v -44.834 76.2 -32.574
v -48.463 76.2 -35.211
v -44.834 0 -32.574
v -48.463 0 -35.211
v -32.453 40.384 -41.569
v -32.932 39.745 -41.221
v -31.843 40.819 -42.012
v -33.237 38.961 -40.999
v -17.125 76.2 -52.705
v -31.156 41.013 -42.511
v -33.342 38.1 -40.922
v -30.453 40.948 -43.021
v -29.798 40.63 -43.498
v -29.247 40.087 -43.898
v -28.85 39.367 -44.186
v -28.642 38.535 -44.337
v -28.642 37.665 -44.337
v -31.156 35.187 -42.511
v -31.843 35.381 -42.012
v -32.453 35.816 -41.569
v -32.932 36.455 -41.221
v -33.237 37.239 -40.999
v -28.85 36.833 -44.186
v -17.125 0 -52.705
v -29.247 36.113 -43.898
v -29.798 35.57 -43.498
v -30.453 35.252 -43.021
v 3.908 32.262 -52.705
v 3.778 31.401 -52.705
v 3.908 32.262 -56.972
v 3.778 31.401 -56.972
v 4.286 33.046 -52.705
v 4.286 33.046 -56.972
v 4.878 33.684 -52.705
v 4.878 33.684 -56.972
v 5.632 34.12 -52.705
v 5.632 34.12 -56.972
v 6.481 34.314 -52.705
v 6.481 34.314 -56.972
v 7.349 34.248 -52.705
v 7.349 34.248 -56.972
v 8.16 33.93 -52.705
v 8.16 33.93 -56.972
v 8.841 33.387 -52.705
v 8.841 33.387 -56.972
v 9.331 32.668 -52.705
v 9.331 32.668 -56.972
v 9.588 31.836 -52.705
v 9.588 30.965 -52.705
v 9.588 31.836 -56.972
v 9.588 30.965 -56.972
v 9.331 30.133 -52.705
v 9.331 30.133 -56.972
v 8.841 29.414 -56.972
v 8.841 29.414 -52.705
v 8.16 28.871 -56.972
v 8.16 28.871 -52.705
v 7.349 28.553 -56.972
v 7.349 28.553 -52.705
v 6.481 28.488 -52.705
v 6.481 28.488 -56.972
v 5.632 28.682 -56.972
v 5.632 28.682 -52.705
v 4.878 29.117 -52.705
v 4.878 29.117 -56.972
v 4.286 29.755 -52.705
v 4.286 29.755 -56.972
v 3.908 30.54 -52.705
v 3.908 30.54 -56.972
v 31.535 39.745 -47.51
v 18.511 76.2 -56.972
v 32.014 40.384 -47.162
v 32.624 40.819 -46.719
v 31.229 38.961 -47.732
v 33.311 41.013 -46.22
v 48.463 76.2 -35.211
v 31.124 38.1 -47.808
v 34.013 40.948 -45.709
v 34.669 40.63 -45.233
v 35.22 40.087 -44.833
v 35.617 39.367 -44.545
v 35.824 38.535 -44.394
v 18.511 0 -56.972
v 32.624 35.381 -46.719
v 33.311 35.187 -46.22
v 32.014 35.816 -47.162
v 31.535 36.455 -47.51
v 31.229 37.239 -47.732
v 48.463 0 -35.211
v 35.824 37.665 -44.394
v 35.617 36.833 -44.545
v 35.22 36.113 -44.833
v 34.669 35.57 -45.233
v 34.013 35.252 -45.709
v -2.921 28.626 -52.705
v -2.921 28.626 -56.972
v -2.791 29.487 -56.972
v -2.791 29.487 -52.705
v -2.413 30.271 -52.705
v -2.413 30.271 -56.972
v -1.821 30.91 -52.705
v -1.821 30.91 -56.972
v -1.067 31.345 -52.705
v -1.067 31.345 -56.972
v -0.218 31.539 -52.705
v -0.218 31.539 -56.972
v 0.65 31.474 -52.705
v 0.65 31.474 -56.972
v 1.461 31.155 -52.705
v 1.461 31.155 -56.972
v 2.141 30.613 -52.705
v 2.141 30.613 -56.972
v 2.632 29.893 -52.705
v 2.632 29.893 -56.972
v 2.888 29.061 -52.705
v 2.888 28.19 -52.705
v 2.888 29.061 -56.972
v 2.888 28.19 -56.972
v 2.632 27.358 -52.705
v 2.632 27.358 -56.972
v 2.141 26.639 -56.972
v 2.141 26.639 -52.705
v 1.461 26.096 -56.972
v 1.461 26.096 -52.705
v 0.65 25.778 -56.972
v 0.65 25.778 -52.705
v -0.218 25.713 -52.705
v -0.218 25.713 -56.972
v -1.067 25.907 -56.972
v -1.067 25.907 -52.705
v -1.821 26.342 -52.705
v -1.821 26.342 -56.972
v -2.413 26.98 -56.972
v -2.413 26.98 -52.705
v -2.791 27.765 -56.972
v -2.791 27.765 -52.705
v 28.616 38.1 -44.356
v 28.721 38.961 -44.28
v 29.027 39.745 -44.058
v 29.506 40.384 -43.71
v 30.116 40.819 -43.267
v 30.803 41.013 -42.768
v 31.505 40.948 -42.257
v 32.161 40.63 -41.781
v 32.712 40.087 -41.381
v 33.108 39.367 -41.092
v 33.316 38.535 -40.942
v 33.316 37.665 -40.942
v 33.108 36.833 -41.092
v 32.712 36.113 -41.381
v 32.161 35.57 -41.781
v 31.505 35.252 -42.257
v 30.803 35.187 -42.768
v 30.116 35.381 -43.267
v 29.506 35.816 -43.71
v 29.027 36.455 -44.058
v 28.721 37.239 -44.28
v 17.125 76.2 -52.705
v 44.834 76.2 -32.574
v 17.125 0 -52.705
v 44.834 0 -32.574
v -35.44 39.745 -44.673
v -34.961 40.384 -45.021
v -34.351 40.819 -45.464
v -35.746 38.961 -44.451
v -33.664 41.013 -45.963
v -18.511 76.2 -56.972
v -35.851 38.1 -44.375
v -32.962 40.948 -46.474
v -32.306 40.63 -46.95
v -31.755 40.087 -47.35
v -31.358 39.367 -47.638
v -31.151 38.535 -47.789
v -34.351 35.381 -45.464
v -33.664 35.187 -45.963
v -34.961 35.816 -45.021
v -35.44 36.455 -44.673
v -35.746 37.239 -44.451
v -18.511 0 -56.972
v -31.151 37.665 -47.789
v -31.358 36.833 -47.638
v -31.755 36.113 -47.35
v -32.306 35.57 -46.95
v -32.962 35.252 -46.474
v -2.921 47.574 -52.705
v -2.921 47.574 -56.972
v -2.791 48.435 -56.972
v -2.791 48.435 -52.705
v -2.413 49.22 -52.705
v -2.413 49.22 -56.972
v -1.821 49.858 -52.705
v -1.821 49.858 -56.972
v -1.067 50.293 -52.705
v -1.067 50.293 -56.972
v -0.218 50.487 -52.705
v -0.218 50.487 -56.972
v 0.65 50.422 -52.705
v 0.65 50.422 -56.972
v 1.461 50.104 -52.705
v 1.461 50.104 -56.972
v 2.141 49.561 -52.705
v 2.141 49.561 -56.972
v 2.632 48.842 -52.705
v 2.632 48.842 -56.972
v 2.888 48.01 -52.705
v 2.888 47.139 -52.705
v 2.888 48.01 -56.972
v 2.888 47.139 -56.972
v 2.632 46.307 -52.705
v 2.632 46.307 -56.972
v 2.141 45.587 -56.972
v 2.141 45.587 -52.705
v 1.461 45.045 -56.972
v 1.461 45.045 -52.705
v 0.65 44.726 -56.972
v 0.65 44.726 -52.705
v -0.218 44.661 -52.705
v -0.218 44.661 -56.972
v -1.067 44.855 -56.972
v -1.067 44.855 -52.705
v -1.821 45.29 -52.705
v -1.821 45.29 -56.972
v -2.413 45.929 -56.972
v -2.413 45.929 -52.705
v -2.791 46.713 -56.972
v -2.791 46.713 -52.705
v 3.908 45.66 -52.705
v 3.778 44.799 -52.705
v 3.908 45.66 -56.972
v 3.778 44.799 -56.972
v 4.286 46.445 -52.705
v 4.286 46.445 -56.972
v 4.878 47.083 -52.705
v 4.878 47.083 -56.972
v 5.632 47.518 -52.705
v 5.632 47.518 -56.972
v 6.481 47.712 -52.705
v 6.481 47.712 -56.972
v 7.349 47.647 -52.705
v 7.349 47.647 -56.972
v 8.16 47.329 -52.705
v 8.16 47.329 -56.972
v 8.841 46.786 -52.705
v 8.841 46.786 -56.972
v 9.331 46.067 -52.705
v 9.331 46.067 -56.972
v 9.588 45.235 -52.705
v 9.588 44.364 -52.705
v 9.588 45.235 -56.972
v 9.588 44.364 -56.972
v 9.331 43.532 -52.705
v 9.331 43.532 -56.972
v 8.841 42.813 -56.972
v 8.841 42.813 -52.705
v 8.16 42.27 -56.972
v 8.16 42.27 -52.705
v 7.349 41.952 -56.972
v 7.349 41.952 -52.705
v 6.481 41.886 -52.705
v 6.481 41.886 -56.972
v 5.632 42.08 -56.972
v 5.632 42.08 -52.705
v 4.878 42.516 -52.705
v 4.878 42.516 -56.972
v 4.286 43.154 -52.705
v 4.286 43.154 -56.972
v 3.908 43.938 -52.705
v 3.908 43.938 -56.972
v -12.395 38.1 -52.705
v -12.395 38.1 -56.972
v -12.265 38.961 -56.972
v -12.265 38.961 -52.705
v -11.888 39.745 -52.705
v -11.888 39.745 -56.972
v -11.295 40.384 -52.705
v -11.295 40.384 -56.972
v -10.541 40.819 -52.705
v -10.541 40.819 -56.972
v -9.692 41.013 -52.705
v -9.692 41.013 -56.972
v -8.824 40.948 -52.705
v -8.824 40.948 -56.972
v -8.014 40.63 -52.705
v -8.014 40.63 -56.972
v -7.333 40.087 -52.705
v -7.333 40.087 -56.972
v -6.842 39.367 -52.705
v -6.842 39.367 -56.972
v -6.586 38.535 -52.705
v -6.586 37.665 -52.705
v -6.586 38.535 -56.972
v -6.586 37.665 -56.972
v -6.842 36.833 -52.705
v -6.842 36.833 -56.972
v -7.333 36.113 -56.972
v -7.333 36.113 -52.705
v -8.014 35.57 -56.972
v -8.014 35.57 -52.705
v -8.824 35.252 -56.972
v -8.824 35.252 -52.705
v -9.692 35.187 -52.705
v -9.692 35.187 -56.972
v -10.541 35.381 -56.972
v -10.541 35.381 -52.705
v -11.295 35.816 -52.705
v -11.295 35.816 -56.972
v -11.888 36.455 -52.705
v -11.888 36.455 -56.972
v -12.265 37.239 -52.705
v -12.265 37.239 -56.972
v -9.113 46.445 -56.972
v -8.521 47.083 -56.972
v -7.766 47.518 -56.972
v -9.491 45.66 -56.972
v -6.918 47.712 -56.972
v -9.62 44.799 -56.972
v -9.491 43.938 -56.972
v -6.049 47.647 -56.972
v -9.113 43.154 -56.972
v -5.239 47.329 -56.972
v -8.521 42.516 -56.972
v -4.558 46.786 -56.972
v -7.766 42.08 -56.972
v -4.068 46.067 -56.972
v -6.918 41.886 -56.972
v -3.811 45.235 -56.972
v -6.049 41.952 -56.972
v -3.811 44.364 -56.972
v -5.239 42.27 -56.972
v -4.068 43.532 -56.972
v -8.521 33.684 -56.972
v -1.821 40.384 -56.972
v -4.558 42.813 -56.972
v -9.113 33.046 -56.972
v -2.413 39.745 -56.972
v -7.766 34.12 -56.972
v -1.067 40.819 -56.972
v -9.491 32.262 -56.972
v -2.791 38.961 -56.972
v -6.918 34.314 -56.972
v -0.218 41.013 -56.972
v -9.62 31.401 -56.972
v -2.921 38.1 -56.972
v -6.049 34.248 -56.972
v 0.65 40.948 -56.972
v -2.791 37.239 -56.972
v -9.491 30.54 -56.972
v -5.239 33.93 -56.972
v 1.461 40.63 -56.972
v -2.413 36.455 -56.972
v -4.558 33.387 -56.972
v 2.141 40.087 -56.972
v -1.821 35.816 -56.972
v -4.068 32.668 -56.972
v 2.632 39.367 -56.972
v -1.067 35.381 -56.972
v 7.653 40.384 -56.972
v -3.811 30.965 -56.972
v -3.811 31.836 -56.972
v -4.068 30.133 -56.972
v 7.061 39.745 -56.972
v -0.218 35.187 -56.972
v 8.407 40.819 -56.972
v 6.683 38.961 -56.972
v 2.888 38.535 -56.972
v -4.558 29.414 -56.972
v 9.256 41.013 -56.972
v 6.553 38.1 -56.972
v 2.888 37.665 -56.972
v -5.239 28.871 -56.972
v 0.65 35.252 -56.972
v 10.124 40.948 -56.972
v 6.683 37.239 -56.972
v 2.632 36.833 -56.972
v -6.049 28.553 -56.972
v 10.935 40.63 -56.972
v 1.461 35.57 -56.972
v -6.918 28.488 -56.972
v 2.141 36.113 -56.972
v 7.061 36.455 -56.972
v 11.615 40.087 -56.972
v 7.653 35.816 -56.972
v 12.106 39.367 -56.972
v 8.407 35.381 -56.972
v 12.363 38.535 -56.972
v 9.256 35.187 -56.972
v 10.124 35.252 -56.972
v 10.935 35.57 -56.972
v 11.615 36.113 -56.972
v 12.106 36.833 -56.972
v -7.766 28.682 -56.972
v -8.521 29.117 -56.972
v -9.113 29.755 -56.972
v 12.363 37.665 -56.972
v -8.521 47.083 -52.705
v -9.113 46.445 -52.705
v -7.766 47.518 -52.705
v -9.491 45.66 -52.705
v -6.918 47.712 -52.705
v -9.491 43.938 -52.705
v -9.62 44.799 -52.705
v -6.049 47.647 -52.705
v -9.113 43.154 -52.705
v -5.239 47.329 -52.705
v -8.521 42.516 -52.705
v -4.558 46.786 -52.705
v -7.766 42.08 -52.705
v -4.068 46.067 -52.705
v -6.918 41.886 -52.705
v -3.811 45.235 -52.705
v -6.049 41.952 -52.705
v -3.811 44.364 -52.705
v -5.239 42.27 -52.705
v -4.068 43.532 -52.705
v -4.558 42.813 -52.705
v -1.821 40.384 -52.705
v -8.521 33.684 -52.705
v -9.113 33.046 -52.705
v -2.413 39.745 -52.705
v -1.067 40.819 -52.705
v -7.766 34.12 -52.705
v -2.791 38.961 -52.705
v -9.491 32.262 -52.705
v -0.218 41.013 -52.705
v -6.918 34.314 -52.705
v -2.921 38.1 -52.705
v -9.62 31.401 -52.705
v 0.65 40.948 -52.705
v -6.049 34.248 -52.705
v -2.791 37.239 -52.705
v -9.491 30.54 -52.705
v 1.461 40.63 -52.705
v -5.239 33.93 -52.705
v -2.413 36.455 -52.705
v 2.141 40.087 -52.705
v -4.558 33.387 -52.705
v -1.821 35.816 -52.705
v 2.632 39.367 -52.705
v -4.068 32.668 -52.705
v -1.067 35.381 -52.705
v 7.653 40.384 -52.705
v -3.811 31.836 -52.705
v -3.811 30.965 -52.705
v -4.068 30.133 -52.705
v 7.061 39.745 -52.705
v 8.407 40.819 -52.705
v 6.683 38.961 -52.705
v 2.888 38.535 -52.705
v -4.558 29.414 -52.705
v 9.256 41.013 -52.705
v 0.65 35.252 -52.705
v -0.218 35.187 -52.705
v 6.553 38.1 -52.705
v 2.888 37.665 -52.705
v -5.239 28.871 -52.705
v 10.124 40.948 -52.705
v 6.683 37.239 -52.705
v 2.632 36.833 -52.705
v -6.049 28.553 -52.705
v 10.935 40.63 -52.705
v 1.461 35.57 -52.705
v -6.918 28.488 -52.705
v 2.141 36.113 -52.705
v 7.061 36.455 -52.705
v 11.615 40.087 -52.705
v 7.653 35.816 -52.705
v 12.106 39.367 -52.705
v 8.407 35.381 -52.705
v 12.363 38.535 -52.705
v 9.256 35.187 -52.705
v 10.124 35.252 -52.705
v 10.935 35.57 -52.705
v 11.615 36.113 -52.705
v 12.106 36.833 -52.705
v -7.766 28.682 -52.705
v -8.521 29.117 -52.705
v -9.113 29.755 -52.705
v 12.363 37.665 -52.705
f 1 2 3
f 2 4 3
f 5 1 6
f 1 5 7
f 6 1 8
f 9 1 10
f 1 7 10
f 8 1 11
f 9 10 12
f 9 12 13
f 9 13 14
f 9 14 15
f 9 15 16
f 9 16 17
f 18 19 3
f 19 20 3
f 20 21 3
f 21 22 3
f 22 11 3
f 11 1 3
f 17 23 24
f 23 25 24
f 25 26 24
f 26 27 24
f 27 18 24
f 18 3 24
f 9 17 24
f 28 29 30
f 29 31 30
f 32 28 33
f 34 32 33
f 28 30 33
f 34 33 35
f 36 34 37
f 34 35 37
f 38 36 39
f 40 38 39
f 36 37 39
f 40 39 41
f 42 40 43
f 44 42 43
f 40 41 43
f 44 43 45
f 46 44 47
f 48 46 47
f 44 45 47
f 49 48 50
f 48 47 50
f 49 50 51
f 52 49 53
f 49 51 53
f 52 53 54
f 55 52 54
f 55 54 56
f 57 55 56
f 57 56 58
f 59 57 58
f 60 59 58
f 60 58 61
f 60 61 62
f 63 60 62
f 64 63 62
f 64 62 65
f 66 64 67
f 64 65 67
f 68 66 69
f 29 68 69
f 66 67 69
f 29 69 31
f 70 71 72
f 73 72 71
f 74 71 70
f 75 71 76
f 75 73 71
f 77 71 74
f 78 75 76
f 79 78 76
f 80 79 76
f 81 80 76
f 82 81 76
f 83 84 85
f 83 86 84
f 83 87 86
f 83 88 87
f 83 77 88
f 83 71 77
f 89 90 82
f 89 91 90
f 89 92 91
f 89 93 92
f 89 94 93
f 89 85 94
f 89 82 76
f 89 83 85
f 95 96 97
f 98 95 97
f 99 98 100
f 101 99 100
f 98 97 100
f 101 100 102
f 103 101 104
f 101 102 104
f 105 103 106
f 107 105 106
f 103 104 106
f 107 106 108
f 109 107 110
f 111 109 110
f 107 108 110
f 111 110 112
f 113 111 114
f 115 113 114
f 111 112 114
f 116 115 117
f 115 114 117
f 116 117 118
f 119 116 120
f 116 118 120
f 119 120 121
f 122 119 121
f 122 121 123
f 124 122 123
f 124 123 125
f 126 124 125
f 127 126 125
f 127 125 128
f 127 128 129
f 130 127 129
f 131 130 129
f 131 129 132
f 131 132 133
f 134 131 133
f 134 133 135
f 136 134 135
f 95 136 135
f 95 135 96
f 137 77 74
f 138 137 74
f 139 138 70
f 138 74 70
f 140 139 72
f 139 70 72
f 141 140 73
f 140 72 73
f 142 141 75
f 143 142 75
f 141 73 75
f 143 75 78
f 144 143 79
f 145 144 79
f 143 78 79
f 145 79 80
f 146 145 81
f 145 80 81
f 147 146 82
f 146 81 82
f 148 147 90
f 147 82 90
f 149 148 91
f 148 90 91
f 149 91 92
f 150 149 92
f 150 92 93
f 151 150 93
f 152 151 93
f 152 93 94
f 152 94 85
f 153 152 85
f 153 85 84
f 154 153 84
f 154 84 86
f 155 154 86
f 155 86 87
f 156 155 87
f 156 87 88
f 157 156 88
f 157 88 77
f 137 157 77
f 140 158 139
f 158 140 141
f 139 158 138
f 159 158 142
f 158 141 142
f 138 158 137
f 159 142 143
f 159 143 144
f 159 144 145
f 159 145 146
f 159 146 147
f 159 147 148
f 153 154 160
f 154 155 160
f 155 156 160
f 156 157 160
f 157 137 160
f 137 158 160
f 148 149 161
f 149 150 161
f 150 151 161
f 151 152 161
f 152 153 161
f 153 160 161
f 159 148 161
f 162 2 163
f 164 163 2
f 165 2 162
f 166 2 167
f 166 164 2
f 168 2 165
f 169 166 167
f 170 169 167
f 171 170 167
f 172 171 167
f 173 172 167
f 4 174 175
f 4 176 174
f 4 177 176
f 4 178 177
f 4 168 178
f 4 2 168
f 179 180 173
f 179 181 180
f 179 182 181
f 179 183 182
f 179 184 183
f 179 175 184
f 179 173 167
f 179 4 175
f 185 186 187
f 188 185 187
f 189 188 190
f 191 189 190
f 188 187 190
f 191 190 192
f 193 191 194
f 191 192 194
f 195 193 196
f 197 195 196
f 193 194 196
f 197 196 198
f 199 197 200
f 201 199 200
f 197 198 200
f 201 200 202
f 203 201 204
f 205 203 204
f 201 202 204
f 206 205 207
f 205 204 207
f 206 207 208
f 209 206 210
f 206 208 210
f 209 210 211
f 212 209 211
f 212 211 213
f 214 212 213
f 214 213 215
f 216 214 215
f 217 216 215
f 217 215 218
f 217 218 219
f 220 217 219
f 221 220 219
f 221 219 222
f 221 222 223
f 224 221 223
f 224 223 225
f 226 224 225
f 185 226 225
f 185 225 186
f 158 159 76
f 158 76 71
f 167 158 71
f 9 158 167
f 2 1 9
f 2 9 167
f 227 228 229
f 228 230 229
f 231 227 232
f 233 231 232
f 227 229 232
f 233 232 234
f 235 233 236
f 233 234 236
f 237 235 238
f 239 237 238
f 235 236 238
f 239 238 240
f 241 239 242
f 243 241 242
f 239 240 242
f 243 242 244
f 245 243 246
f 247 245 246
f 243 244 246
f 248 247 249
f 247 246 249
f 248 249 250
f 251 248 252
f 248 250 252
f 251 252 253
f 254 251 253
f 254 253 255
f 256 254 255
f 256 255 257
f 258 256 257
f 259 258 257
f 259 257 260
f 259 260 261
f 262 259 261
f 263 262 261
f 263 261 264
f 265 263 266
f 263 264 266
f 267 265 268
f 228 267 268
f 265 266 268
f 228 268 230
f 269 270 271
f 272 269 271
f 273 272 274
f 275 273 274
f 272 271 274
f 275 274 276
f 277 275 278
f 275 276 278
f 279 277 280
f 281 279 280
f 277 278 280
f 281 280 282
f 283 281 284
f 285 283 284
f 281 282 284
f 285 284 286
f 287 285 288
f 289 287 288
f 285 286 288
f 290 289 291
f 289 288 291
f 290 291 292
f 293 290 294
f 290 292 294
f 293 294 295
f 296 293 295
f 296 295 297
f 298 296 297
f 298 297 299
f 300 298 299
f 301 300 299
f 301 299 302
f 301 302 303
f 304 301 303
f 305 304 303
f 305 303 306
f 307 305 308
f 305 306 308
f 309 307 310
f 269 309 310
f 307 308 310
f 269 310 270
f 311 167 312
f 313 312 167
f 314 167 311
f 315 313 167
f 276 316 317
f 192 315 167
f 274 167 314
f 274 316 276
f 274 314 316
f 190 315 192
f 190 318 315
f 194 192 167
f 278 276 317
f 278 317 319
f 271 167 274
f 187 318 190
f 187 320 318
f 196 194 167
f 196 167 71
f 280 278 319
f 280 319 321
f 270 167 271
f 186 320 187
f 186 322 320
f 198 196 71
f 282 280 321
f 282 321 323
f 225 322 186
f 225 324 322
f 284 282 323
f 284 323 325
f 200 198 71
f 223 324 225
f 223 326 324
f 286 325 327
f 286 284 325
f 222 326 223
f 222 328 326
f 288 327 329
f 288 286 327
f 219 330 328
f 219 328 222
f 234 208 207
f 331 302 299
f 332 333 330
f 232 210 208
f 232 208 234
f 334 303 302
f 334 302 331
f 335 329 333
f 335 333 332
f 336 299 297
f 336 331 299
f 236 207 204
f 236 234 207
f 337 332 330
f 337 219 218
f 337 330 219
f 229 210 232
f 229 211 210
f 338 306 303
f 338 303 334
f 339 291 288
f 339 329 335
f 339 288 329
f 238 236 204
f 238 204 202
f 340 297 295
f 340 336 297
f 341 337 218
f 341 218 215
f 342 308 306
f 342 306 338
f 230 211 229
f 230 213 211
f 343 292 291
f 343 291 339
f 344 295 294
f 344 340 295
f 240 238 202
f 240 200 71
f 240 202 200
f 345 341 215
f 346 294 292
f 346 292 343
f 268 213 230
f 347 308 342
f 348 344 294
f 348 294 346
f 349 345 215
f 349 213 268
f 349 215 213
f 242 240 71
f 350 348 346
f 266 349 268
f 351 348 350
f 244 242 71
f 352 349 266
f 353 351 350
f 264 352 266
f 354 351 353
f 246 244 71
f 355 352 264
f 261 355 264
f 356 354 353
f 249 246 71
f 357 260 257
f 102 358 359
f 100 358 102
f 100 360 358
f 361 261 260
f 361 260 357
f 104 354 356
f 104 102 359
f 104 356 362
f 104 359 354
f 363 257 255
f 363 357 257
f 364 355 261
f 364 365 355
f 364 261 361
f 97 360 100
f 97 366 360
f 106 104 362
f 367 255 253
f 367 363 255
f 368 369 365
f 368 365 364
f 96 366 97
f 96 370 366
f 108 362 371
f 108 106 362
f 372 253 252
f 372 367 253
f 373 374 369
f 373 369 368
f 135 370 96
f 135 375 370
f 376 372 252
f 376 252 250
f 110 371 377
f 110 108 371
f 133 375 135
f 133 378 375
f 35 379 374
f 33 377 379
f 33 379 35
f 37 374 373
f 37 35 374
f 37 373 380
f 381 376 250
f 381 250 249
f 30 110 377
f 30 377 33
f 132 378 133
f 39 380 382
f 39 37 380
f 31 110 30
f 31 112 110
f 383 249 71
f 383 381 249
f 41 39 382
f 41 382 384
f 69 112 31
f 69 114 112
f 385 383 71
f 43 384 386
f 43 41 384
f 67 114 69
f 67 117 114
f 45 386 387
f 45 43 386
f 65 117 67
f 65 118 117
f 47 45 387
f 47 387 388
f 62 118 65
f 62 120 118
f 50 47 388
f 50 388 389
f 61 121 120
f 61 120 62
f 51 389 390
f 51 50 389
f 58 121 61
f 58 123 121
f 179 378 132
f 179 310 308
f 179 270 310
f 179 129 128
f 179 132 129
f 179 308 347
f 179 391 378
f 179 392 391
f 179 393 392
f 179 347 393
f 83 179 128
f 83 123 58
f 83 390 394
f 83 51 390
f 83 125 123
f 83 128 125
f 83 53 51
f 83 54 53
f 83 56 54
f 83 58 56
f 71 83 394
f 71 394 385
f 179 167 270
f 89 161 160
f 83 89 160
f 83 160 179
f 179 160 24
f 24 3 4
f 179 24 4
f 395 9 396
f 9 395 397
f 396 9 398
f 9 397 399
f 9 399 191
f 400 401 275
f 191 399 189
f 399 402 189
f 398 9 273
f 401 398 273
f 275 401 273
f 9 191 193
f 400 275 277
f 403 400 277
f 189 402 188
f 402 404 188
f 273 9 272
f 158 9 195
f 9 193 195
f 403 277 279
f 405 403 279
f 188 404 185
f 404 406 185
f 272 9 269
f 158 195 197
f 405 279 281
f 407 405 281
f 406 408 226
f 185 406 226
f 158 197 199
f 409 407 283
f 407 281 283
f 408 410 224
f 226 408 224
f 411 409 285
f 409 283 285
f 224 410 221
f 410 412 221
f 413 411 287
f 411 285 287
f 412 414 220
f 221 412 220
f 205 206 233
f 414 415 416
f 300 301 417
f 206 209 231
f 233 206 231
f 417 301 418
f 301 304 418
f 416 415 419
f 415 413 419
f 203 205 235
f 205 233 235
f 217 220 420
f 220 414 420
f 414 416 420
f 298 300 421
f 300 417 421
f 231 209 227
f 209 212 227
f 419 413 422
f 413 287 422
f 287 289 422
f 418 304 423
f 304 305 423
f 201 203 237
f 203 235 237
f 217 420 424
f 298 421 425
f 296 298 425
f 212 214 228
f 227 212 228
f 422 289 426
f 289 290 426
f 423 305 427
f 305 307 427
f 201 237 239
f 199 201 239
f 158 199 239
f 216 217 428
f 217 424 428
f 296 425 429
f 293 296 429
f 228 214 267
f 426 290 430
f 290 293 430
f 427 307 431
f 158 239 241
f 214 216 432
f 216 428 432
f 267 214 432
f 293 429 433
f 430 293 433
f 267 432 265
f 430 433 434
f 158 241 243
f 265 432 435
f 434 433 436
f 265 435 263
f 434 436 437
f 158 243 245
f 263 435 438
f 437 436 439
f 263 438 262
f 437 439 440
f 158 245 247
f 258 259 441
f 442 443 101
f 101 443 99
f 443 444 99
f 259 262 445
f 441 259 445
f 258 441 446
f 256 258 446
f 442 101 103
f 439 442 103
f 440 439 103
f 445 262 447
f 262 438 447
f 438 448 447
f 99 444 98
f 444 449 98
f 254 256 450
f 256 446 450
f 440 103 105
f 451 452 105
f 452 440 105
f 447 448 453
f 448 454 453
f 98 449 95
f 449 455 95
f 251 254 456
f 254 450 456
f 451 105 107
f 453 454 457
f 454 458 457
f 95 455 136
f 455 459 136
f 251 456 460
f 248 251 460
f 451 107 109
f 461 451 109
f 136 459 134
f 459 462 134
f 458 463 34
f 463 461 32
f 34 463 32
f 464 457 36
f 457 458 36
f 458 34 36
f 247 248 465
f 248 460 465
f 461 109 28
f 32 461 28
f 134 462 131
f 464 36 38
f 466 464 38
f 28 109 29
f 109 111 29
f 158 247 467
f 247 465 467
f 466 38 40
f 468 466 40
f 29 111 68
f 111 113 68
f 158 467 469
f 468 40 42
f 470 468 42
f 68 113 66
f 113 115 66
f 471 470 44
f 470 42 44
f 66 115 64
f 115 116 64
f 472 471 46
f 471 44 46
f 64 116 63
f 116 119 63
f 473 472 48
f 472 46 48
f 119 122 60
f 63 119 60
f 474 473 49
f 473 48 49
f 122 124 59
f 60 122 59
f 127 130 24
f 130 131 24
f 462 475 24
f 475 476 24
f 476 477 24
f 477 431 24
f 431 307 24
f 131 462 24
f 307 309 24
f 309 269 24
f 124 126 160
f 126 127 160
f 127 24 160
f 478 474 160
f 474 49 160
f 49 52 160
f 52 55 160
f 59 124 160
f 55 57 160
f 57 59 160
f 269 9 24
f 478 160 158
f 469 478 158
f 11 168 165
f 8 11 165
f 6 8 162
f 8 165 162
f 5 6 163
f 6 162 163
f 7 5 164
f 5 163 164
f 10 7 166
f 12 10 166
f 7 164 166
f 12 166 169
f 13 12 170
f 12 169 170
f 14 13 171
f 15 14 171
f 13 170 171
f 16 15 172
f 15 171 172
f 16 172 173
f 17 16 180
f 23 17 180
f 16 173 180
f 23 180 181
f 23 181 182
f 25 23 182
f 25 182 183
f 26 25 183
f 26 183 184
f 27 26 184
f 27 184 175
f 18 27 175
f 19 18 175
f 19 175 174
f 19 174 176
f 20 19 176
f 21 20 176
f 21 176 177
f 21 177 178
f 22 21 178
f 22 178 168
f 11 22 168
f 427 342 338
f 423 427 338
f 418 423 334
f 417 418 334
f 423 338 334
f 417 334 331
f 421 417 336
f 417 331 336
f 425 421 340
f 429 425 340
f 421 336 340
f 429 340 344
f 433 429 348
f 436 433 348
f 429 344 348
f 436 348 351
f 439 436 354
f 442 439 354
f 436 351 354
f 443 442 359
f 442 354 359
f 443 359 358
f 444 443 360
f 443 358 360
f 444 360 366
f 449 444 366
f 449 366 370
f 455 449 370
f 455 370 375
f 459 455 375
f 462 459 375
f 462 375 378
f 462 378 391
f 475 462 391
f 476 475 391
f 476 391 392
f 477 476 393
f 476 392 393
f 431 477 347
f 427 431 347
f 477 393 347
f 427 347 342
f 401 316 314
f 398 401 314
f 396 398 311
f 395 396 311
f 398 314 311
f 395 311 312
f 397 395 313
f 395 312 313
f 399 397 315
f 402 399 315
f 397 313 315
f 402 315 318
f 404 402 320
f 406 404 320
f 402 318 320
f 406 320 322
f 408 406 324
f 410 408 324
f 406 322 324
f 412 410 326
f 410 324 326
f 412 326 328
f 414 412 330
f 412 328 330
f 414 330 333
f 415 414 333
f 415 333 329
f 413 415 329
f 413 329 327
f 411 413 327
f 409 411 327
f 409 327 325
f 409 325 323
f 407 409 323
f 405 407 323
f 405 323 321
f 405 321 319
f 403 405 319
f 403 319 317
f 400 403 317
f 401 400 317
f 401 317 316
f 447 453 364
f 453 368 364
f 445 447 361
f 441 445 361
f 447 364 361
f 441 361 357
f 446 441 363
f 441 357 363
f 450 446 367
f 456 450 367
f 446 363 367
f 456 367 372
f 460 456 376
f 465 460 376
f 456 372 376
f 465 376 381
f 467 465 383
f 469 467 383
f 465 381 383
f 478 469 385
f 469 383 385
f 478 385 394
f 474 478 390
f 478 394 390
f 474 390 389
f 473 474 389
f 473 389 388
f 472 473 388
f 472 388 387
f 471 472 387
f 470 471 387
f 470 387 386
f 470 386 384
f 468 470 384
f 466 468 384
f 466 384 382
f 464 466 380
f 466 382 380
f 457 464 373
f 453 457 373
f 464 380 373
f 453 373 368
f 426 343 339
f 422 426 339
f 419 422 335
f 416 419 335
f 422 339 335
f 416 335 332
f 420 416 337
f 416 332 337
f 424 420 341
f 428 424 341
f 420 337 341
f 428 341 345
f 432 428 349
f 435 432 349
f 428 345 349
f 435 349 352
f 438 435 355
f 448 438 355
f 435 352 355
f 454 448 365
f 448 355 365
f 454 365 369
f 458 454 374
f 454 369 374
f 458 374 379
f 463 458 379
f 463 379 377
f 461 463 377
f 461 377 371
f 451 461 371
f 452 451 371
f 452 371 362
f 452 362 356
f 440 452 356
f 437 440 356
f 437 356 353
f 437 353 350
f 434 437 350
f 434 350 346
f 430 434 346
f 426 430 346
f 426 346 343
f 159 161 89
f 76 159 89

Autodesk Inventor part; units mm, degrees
ref_plane "YZ Plane" through (0, 0, 0) normal (1, 0, 0) x (0, 1, 0)
ref_plane "XZ Plane" through (0, 0, 0) normal (0, 1, 0) x (-1, 0, 0)
ref_plane "XY Plane" through (0, 0, 0) normal (0, 0, 1) x (1, 0, 0)
sketch "Sketch1" plane through (0, 0, 0) normal (0, 1, 0) x (-1, 0, 0)
  line L0 (44.8336, -32.5735) -> (17.1249, -52.705)
  line L1 (17.1249, -52.705) -> (-17.1249, -52.705)
  line L2 (-17.1249, -52.705) -> (-44.8336, -32.5735)
  line L3 (48.4634, -35.2108) -> (18.5114, -56.9722)
  line L4 (18.5114, -56.9722) -> (-18.5114, -56.9722)
  line L5 (-18.5114, -56.9722) -> (-48.4634, -35.2108)
  line L6 (48.4634, -35.2108) -> (44.8336, -32.5735)
  line L7 (-44.8336, -32.5735) -> (-48.4634, -35.2108)
  point P0 (0, 0)
  point P1 (0, 0)
  point P2 (0, 0)
  dimension "d0" = 52.705
  dimension "d1" = 4.2672
extrude "Extrusion1" add sketch "Sketch1" along normal blind 76.2
sketch "Sketch2" plane through (18.5114, 0, -56.9722) normal (0.5878, 0, -0.809) x (-0.809, 0, -0.5878)
  circle A0 centre (-18.5114, 38.1) radius 2.921
  line L0 (-37.0228, 76.2) -> (0, 76.2) projected
  point P0 (-18.5114, 0)
  dimension "d4" = 5.842
  dimension "d5" = 38.1
sketch "Sketch3" plane through (18.5114, 0, -56.9722) normal (0, 0, -1) x (-1, 0, 0)
  circle A0 centre (18.5114, 38.1) radius 2.921
  line L0 (0, 76.2) -> (37.0228, 76.2) projected
  point P0 (18.5114, 0)
  dimension "d6" = 5.842
  dimension "d7" = 38.1
sketch "Sketch4" plane through (-48.4634, 0, -35.2108) normal (-0.5878, 0, -0.809) x (-0.809, 0, 0.5878)
  circle A0 centre (-18.5114, 38.1) radius 2.921
  line L0 (-37.0228, 76.2) -> (0, 76.2) projected
  point P0 (-18.5114, 0)
  dimension "d8" = 5.842
  dimension "d9" = 38.1
extrude "Extrusion2" cut sketch "Sketch2" against normal through all
extrude "Extrusion3" cut sketch "Sketch3" against normal blind 4.2672
extrude "Extrusion4" cut sketch "Sketch4" against normal blind 4.2672
sketch "Sketch5" plane through (18.5114, 0, -56.9722) normal (0, 0, -1) x (-1, 0, 0)
  circle A0 centre (18.5114, 38.1) radius 2.921 projected
  circle A1 centre (18.5114, 47.5742) radius 2.921
  circle A2 centre (11.8121, 44.7993) radius 2.921
  circle A3 centre (9.0372, 38.1) radius 2.921
  circle A4 centre (11.8121, 31.4007) radius 2.921
  circle A5 centre (18.5114, 28.6258) radius 2.921
  circle A6 centre (25.2107, 31.4007) radius 2.921
  circle A7 centre (27.9856, 38.1) radius 2.921
  circle A8 centre (25.2107, 44.7993) radius 2.921
  point P0 (18.5114, 0)
  dimension "d17" = 5.842
  dimension "d21" = 360
extrude "Extrusion5" cut sketch "Sketch5" against normal through all contours A1 | A2 | A3 | A4 | A5 | A6 | A7 | A8
properties part number "10 bracket"
